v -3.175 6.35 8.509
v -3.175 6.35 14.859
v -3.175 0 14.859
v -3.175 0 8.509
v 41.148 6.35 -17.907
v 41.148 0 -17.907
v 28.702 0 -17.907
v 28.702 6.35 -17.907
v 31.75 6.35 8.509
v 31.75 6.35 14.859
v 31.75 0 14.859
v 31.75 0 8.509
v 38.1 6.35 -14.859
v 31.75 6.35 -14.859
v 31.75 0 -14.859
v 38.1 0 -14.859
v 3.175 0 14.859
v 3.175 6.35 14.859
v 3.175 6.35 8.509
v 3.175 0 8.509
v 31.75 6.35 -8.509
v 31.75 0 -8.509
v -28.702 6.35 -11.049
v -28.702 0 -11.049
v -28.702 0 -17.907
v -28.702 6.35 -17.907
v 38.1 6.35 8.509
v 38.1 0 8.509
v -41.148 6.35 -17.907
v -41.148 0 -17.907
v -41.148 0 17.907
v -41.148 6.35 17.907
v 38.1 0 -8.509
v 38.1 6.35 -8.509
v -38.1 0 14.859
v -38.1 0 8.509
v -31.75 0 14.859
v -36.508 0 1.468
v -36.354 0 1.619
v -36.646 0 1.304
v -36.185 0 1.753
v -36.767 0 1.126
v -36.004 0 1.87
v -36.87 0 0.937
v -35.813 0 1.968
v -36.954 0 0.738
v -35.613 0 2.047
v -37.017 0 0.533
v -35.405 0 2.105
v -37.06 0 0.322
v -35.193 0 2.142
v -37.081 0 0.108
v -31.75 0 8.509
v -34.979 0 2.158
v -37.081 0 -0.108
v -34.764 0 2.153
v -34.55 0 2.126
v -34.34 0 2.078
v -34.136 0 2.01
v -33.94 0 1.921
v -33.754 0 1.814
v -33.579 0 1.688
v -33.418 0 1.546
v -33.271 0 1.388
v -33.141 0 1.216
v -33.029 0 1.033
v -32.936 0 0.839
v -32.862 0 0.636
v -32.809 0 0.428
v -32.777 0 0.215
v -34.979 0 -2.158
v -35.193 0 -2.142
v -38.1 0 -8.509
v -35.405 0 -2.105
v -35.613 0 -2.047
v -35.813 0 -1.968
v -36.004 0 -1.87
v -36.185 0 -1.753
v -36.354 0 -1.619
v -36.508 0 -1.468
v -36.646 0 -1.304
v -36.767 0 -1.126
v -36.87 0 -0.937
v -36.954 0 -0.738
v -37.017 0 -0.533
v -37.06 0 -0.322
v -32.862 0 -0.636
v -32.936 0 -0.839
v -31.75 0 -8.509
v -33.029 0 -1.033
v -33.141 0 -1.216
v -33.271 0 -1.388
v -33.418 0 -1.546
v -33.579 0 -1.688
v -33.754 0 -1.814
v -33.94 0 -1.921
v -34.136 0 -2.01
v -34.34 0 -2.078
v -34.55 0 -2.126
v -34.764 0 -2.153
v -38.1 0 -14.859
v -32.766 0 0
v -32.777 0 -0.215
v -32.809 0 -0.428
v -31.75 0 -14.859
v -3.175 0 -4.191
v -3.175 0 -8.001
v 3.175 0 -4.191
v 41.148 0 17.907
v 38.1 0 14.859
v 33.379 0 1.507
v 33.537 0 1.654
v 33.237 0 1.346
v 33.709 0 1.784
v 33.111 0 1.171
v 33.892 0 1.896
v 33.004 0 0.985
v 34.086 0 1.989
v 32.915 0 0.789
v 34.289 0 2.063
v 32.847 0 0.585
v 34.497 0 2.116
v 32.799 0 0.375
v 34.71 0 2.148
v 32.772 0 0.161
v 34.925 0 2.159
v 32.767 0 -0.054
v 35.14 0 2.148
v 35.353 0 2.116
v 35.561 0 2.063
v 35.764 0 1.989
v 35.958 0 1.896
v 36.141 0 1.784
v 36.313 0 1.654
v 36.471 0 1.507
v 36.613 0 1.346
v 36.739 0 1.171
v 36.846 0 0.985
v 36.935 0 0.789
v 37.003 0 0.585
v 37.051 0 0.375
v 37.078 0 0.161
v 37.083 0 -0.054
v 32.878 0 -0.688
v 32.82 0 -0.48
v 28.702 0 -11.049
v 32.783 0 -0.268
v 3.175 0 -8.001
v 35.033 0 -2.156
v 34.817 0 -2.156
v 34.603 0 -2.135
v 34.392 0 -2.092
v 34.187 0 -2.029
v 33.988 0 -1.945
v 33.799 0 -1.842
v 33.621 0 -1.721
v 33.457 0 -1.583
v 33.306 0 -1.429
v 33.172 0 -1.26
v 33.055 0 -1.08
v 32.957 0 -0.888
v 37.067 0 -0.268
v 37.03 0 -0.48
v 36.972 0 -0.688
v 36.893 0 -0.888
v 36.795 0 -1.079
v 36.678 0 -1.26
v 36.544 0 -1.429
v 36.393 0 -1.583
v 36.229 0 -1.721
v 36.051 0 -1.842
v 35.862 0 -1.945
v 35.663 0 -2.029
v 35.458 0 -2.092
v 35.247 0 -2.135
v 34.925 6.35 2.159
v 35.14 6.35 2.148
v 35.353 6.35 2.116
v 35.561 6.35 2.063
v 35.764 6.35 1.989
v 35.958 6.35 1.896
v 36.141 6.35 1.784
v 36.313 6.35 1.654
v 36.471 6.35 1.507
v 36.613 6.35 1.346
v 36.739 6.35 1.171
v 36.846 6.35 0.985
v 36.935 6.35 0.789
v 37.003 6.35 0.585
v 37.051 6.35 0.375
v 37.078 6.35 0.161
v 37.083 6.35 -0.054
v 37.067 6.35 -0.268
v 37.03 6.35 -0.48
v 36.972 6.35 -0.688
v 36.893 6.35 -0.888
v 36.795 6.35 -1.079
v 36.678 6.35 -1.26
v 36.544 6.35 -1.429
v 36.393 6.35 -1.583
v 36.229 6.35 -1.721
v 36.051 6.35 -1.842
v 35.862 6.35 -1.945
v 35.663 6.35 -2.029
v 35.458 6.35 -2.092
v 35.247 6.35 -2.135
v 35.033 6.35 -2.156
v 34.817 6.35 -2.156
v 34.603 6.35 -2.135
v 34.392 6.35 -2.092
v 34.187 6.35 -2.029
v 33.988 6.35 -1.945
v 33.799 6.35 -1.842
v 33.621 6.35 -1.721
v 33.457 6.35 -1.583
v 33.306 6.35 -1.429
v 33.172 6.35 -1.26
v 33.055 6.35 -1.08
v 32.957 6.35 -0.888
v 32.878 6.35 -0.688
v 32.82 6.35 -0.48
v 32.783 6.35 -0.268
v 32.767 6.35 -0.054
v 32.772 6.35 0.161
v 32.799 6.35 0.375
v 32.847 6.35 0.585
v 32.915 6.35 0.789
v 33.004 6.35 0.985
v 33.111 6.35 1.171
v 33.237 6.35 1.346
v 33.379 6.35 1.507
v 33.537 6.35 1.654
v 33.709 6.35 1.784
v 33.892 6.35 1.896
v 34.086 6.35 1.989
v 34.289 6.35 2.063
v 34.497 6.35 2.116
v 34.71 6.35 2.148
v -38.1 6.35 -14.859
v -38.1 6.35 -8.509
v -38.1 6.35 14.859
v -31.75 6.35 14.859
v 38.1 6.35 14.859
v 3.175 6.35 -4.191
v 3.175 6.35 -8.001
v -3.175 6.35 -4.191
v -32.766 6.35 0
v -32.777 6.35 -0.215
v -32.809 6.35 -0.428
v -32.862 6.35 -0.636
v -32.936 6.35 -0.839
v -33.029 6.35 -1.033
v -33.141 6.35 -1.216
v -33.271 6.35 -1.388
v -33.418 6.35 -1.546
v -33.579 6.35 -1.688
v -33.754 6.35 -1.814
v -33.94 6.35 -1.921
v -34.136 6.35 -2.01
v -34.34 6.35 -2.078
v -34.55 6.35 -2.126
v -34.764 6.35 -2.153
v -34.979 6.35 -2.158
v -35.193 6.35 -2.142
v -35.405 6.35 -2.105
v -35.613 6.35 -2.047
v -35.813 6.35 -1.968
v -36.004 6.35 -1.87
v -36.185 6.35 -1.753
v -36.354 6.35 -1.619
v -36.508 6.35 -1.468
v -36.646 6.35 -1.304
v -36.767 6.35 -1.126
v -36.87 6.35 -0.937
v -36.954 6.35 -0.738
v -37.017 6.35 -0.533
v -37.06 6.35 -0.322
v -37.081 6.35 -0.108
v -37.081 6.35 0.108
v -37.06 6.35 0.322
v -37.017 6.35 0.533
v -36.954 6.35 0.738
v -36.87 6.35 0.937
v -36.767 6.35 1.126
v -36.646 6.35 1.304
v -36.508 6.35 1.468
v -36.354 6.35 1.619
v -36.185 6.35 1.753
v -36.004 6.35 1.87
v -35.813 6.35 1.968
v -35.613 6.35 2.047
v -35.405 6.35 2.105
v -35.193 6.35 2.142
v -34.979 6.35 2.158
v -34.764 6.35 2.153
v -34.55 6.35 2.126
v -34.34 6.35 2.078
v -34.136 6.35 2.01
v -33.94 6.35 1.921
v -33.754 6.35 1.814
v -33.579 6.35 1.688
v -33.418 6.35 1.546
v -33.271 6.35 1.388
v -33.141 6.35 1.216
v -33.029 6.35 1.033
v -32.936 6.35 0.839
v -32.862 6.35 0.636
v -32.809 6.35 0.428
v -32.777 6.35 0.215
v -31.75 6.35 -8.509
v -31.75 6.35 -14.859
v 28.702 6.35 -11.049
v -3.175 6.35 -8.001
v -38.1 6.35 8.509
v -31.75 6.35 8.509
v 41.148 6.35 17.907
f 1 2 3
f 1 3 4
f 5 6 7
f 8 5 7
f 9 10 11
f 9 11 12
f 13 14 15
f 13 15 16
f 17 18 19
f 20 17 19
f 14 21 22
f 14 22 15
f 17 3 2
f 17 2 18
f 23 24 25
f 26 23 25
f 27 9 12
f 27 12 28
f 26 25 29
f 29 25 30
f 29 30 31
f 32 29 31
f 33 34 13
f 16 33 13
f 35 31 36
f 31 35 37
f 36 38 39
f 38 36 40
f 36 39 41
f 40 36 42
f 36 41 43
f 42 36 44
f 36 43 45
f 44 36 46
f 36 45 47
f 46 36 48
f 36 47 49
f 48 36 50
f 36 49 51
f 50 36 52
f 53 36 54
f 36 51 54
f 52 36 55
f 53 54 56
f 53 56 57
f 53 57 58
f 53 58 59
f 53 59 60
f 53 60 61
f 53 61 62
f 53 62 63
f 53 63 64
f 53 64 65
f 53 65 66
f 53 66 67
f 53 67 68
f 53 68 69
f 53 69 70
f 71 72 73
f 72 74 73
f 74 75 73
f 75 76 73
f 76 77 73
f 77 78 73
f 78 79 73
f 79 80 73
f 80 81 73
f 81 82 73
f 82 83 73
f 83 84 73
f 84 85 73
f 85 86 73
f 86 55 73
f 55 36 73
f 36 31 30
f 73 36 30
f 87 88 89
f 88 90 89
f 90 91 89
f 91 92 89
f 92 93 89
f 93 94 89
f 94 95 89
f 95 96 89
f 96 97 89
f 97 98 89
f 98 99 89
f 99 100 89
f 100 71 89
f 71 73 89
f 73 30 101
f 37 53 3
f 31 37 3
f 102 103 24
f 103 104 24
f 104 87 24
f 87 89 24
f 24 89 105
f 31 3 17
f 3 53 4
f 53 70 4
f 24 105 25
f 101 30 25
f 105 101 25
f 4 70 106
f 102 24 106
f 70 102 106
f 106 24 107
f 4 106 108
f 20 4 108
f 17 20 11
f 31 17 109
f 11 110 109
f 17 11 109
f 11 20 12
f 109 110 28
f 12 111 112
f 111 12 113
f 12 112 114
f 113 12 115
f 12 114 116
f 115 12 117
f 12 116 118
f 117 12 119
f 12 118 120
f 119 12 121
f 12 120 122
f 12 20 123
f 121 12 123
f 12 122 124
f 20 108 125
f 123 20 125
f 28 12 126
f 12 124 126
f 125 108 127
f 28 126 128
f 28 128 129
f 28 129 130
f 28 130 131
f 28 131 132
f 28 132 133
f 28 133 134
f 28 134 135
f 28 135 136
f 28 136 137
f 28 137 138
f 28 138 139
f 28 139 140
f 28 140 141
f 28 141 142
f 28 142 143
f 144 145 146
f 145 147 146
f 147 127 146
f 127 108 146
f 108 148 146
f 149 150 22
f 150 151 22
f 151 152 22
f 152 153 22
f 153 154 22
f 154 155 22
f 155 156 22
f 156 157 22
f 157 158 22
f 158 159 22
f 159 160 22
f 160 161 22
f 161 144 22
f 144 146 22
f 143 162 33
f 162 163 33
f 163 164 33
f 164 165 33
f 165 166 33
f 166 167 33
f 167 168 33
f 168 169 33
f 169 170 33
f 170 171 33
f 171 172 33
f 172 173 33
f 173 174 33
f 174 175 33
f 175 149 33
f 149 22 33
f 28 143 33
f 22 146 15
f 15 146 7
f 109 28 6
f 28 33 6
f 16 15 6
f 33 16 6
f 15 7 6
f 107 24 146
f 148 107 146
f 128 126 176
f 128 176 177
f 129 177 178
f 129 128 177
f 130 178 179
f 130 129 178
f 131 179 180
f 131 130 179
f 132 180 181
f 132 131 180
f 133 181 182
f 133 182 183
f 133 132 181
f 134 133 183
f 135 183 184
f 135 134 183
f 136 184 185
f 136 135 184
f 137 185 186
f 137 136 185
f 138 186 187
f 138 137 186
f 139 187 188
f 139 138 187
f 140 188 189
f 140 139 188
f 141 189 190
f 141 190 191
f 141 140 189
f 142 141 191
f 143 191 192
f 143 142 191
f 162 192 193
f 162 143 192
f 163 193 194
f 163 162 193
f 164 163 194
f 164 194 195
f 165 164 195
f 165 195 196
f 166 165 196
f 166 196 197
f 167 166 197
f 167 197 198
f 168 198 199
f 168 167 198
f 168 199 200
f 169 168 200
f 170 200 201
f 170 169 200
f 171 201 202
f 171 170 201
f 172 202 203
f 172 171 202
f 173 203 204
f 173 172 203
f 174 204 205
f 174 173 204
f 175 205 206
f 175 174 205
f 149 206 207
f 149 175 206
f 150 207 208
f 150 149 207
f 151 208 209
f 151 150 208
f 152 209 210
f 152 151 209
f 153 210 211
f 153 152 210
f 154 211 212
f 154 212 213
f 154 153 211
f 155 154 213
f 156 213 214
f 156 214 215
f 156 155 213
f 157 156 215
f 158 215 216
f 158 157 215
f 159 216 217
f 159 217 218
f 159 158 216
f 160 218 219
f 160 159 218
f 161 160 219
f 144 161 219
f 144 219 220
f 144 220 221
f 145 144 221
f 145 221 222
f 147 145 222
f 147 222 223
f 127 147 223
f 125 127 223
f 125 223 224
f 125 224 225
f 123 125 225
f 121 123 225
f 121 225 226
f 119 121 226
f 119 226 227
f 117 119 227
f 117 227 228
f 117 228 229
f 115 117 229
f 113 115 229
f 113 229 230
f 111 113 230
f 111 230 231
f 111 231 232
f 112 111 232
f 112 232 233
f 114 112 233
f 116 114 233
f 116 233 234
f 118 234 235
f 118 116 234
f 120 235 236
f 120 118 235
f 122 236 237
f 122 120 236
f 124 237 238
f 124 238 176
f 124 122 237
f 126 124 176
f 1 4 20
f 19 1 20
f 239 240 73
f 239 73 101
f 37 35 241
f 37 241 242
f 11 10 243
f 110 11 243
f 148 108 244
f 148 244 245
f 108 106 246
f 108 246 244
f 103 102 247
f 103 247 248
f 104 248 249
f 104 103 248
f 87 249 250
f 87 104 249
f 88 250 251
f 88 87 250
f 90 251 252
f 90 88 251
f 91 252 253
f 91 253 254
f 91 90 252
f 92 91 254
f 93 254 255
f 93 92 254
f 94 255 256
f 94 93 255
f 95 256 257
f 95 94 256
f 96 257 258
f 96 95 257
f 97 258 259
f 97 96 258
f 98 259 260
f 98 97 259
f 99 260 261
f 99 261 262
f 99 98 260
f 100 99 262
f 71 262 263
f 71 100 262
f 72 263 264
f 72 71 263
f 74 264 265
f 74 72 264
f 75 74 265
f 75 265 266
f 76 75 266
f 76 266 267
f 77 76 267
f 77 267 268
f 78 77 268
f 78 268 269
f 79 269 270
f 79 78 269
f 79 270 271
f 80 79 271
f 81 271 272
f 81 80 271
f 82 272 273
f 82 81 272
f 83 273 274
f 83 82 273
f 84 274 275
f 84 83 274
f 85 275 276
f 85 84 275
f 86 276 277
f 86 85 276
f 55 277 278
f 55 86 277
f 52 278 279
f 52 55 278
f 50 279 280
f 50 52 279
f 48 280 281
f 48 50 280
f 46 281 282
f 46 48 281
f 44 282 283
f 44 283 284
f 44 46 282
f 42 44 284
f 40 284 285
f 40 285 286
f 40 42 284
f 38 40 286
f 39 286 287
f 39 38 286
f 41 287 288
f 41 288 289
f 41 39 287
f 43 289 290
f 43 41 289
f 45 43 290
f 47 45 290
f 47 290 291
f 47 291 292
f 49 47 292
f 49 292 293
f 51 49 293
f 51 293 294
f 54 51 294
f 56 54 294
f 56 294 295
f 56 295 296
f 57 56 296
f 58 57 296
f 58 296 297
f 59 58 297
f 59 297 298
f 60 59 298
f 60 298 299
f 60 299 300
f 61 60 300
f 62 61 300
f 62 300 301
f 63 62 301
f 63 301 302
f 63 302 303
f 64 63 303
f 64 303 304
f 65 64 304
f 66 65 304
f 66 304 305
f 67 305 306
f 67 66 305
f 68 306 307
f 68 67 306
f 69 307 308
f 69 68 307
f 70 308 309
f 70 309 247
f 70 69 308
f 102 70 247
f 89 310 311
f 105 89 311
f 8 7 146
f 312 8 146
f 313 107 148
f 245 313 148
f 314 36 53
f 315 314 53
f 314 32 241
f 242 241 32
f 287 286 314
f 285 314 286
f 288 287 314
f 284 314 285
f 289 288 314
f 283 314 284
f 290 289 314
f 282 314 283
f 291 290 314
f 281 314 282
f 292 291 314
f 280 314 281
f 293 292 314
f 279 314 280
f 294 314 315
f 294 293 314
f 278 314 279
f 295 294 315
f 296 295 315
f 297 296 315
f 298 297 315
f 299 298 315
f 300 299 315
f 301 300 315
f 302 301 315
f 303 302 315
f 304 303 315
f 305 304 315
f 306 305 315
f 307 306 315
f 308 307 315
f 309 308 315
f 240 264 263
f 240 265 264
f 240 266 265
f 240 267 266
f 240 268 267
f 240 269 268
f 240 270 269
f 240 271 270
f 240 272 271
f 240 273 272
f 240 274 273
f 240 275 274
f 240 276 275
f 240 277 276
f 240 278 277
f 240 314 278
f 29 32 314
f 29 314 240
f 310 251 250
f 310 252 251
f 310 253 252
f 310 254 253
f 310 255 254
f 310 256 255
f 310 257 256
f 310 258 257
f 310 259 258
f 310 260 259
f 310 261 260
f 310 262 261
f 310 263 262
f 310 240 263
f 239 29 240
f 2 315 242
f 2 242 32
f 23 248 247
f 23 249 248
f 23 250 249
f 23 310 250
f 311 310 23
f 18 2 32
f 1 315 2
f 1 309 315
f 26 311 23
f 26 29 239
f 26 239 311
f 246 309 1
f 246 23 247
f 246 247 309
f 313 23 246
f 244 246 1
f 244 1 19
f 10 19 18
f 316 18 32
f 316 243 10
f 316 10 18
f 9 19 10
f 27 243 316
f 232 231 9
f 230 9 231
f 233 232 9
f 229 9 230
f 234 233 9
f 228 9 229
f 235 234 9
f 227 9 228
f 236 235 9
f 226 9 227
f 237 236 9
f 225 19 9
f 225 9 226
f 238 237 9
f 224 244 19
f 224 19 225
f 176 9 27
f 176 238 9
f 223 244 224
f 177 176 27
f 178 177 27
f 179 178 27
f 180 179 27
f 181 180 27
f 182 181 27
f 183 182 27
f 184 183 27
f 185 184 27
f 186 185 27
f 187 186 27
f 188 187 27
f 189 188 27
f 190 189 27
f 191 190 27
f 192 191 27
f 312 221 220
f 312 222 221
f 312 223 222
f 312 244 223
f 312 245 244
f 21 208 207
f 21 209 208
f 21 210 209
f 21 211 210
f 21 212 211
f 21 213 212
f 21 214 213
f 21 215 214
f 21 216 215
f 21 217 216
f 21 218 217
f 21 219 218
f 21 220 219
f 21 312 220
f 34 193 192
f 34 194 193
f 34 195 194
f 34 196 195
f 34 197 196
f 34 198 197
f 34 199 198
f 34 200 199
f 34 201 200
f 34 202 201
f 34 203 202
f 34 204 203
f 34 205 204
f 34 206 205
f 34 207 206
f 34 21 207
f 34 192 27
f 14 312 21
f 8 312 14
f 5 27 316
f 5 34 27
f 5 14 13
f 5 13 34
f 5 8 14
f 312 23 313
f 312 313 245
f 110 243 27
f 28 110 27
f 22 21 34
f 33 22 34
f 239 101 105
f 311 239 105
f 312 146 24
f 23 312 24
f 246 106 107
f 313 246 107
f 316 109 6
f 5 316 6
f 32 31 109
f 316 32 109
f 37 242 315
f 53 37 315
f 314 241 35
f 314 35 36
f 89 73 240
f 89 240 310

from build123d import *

# Parameters (mm, degrees)
SKETCH1_R           = 2.159
SKETCH1_W           = 6.35
SKETCH1_H           = 6.35
SKETCH1_H_2         = 3.81
BOSS_EXTRUDE1_DEPTH = 6.35


with BuildPart() as part:
    # Sketch1 → Boss-Extrude1 (new body)
    with BuildSketch(Plane(origin=(0, 0, 0), x_dir=(1, 0, 0), z_dir=(0, 1, 0))):
        Polygon((-41.148, -17.907), (41.148, -17.907), (41.148, 17.907), (28.702, 17.907), (28.702, 11.049), (-28.702, 11.049), (-28.702, 17.907), (-41.148, 17.907), align=None)
        with Locations(Location((34.925, 0, 0), (0, 0, 270))):
            Circle(SKETCH1_R, mode=Mode.SUBTRACT)
        with Locations((-34.925, 0)):
            Circle(SKETCH1_R, mode=Mode.SUBTRACT)
        with Locations((0, -11.684)):
            Rectangle(SKETCH1_W, SKETCH1_H, mode=Mode.SUBTRACT)
        with Locations((0, 6.096)):
            Rectangle(SKETCH1_W, SKETCH1_H_2, mode=Mode.SUBTRACT)
        with Locations((34.925, 11.684)):
            Rectangle(SKETCH1_W, SKETCH1_H, mode=Mode.SUBTRACT)
        with Locations((34.925, -11.684)):
            Rectangle(SKETCH1_W, SKETCH1_H, mode=Mode.SUBTRACT)
        with Locations((-34.925, 11.684)):
            Rectangle(SKETCH1_W, SKETCH1_H, mode=Mode.SUBTRACT)
        with Locations((-34.925, -11.684)):
            Rectangle(SKETCH1_W, SKETCH1_H, mode=Mode.SUBTRACT)
    extrude(amount=BOSS_EXTRUDE1_DEPTH)


solid = part.part
